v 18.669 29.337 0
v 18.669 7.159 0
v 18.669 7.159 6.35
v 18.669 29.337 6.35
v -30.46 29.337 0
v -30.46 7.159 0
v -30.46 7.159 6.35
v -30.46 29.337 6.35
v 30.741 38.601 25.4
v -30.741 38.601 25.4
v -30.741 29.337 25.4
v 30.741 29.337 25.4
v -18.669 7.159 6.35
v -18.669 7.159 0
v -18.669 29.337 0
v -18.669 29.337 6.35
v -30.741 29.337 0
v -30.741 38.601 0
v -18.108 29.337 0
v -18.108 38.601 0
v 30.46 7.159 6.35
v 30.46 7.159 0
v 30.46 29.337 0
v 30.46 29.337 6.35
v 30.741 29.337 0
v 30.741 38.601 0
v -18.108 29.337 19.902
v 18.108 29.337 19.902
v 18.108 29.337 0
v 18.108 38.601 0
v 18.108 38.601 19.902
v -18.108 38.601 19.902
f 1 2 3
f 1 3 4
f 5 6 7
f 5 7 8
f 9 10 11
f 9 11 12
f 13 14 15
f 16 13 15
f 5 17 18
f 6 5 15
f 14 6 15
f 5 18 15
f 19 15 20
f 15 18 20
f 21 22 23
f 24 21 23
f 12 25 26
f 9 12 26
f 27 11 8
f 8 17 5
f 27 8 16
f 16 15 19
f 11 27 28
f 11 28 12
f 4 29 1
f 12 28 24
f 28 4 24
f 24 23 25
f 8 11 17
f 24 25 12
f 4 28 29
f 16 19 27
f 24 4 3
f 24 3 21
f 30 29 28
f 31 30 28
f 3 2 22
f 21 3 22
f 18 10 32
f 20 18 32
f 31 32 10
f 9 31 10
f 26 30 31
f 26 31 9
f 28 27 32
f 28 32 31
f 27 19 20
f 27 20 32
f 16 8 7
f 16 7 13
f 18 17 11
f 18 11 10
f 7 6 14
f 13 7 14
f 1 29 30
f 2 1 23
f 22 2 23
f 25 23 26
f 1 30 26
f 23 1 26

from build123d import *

# Parameters (mm, degrees)
F0_W     = 61.481372
F0_H     = 9.264317
F1_DEPTH = 25.4
F2_W     = 11.790948
F2_H     = 22.739682
F3_DEPTH = 6.35
F4_W     = 36.215054
F4_H     = 19.90229
F5_DEPTH = 38.602317


with BuildPart() as f1:
    # F0 (on Top) → F1 (new body)
    with BuildSketch(Plane.XY):
        with Locations((0, 33.969158)):
            Rectangle(F0_W, F0_H)
    extrude(amount=F1_DEPTH)

    # F2 (on Top) → F3 (join)
    with BuildSketch(Plane.XY):
        with Locations((-24.564476, 18.528631)):
            Rectangle(F2_W, F2_H)
        with Locations((24.564476, 18.528631)):
            Rectangle(F2_W, F2_H)
    extrude(amount=F3_DEPTH)

    # F4 (on Front) → F5 (cut, through all)
    with BuildSketch(Plane.XZ):
        with Locations((-1e-06, 9.951145)):
            Rectangle(F4_W, F4_H)
    extrude(amount=-F5_DEPTH, mode=Mode.SUBTRACT)


solid = f1.part
